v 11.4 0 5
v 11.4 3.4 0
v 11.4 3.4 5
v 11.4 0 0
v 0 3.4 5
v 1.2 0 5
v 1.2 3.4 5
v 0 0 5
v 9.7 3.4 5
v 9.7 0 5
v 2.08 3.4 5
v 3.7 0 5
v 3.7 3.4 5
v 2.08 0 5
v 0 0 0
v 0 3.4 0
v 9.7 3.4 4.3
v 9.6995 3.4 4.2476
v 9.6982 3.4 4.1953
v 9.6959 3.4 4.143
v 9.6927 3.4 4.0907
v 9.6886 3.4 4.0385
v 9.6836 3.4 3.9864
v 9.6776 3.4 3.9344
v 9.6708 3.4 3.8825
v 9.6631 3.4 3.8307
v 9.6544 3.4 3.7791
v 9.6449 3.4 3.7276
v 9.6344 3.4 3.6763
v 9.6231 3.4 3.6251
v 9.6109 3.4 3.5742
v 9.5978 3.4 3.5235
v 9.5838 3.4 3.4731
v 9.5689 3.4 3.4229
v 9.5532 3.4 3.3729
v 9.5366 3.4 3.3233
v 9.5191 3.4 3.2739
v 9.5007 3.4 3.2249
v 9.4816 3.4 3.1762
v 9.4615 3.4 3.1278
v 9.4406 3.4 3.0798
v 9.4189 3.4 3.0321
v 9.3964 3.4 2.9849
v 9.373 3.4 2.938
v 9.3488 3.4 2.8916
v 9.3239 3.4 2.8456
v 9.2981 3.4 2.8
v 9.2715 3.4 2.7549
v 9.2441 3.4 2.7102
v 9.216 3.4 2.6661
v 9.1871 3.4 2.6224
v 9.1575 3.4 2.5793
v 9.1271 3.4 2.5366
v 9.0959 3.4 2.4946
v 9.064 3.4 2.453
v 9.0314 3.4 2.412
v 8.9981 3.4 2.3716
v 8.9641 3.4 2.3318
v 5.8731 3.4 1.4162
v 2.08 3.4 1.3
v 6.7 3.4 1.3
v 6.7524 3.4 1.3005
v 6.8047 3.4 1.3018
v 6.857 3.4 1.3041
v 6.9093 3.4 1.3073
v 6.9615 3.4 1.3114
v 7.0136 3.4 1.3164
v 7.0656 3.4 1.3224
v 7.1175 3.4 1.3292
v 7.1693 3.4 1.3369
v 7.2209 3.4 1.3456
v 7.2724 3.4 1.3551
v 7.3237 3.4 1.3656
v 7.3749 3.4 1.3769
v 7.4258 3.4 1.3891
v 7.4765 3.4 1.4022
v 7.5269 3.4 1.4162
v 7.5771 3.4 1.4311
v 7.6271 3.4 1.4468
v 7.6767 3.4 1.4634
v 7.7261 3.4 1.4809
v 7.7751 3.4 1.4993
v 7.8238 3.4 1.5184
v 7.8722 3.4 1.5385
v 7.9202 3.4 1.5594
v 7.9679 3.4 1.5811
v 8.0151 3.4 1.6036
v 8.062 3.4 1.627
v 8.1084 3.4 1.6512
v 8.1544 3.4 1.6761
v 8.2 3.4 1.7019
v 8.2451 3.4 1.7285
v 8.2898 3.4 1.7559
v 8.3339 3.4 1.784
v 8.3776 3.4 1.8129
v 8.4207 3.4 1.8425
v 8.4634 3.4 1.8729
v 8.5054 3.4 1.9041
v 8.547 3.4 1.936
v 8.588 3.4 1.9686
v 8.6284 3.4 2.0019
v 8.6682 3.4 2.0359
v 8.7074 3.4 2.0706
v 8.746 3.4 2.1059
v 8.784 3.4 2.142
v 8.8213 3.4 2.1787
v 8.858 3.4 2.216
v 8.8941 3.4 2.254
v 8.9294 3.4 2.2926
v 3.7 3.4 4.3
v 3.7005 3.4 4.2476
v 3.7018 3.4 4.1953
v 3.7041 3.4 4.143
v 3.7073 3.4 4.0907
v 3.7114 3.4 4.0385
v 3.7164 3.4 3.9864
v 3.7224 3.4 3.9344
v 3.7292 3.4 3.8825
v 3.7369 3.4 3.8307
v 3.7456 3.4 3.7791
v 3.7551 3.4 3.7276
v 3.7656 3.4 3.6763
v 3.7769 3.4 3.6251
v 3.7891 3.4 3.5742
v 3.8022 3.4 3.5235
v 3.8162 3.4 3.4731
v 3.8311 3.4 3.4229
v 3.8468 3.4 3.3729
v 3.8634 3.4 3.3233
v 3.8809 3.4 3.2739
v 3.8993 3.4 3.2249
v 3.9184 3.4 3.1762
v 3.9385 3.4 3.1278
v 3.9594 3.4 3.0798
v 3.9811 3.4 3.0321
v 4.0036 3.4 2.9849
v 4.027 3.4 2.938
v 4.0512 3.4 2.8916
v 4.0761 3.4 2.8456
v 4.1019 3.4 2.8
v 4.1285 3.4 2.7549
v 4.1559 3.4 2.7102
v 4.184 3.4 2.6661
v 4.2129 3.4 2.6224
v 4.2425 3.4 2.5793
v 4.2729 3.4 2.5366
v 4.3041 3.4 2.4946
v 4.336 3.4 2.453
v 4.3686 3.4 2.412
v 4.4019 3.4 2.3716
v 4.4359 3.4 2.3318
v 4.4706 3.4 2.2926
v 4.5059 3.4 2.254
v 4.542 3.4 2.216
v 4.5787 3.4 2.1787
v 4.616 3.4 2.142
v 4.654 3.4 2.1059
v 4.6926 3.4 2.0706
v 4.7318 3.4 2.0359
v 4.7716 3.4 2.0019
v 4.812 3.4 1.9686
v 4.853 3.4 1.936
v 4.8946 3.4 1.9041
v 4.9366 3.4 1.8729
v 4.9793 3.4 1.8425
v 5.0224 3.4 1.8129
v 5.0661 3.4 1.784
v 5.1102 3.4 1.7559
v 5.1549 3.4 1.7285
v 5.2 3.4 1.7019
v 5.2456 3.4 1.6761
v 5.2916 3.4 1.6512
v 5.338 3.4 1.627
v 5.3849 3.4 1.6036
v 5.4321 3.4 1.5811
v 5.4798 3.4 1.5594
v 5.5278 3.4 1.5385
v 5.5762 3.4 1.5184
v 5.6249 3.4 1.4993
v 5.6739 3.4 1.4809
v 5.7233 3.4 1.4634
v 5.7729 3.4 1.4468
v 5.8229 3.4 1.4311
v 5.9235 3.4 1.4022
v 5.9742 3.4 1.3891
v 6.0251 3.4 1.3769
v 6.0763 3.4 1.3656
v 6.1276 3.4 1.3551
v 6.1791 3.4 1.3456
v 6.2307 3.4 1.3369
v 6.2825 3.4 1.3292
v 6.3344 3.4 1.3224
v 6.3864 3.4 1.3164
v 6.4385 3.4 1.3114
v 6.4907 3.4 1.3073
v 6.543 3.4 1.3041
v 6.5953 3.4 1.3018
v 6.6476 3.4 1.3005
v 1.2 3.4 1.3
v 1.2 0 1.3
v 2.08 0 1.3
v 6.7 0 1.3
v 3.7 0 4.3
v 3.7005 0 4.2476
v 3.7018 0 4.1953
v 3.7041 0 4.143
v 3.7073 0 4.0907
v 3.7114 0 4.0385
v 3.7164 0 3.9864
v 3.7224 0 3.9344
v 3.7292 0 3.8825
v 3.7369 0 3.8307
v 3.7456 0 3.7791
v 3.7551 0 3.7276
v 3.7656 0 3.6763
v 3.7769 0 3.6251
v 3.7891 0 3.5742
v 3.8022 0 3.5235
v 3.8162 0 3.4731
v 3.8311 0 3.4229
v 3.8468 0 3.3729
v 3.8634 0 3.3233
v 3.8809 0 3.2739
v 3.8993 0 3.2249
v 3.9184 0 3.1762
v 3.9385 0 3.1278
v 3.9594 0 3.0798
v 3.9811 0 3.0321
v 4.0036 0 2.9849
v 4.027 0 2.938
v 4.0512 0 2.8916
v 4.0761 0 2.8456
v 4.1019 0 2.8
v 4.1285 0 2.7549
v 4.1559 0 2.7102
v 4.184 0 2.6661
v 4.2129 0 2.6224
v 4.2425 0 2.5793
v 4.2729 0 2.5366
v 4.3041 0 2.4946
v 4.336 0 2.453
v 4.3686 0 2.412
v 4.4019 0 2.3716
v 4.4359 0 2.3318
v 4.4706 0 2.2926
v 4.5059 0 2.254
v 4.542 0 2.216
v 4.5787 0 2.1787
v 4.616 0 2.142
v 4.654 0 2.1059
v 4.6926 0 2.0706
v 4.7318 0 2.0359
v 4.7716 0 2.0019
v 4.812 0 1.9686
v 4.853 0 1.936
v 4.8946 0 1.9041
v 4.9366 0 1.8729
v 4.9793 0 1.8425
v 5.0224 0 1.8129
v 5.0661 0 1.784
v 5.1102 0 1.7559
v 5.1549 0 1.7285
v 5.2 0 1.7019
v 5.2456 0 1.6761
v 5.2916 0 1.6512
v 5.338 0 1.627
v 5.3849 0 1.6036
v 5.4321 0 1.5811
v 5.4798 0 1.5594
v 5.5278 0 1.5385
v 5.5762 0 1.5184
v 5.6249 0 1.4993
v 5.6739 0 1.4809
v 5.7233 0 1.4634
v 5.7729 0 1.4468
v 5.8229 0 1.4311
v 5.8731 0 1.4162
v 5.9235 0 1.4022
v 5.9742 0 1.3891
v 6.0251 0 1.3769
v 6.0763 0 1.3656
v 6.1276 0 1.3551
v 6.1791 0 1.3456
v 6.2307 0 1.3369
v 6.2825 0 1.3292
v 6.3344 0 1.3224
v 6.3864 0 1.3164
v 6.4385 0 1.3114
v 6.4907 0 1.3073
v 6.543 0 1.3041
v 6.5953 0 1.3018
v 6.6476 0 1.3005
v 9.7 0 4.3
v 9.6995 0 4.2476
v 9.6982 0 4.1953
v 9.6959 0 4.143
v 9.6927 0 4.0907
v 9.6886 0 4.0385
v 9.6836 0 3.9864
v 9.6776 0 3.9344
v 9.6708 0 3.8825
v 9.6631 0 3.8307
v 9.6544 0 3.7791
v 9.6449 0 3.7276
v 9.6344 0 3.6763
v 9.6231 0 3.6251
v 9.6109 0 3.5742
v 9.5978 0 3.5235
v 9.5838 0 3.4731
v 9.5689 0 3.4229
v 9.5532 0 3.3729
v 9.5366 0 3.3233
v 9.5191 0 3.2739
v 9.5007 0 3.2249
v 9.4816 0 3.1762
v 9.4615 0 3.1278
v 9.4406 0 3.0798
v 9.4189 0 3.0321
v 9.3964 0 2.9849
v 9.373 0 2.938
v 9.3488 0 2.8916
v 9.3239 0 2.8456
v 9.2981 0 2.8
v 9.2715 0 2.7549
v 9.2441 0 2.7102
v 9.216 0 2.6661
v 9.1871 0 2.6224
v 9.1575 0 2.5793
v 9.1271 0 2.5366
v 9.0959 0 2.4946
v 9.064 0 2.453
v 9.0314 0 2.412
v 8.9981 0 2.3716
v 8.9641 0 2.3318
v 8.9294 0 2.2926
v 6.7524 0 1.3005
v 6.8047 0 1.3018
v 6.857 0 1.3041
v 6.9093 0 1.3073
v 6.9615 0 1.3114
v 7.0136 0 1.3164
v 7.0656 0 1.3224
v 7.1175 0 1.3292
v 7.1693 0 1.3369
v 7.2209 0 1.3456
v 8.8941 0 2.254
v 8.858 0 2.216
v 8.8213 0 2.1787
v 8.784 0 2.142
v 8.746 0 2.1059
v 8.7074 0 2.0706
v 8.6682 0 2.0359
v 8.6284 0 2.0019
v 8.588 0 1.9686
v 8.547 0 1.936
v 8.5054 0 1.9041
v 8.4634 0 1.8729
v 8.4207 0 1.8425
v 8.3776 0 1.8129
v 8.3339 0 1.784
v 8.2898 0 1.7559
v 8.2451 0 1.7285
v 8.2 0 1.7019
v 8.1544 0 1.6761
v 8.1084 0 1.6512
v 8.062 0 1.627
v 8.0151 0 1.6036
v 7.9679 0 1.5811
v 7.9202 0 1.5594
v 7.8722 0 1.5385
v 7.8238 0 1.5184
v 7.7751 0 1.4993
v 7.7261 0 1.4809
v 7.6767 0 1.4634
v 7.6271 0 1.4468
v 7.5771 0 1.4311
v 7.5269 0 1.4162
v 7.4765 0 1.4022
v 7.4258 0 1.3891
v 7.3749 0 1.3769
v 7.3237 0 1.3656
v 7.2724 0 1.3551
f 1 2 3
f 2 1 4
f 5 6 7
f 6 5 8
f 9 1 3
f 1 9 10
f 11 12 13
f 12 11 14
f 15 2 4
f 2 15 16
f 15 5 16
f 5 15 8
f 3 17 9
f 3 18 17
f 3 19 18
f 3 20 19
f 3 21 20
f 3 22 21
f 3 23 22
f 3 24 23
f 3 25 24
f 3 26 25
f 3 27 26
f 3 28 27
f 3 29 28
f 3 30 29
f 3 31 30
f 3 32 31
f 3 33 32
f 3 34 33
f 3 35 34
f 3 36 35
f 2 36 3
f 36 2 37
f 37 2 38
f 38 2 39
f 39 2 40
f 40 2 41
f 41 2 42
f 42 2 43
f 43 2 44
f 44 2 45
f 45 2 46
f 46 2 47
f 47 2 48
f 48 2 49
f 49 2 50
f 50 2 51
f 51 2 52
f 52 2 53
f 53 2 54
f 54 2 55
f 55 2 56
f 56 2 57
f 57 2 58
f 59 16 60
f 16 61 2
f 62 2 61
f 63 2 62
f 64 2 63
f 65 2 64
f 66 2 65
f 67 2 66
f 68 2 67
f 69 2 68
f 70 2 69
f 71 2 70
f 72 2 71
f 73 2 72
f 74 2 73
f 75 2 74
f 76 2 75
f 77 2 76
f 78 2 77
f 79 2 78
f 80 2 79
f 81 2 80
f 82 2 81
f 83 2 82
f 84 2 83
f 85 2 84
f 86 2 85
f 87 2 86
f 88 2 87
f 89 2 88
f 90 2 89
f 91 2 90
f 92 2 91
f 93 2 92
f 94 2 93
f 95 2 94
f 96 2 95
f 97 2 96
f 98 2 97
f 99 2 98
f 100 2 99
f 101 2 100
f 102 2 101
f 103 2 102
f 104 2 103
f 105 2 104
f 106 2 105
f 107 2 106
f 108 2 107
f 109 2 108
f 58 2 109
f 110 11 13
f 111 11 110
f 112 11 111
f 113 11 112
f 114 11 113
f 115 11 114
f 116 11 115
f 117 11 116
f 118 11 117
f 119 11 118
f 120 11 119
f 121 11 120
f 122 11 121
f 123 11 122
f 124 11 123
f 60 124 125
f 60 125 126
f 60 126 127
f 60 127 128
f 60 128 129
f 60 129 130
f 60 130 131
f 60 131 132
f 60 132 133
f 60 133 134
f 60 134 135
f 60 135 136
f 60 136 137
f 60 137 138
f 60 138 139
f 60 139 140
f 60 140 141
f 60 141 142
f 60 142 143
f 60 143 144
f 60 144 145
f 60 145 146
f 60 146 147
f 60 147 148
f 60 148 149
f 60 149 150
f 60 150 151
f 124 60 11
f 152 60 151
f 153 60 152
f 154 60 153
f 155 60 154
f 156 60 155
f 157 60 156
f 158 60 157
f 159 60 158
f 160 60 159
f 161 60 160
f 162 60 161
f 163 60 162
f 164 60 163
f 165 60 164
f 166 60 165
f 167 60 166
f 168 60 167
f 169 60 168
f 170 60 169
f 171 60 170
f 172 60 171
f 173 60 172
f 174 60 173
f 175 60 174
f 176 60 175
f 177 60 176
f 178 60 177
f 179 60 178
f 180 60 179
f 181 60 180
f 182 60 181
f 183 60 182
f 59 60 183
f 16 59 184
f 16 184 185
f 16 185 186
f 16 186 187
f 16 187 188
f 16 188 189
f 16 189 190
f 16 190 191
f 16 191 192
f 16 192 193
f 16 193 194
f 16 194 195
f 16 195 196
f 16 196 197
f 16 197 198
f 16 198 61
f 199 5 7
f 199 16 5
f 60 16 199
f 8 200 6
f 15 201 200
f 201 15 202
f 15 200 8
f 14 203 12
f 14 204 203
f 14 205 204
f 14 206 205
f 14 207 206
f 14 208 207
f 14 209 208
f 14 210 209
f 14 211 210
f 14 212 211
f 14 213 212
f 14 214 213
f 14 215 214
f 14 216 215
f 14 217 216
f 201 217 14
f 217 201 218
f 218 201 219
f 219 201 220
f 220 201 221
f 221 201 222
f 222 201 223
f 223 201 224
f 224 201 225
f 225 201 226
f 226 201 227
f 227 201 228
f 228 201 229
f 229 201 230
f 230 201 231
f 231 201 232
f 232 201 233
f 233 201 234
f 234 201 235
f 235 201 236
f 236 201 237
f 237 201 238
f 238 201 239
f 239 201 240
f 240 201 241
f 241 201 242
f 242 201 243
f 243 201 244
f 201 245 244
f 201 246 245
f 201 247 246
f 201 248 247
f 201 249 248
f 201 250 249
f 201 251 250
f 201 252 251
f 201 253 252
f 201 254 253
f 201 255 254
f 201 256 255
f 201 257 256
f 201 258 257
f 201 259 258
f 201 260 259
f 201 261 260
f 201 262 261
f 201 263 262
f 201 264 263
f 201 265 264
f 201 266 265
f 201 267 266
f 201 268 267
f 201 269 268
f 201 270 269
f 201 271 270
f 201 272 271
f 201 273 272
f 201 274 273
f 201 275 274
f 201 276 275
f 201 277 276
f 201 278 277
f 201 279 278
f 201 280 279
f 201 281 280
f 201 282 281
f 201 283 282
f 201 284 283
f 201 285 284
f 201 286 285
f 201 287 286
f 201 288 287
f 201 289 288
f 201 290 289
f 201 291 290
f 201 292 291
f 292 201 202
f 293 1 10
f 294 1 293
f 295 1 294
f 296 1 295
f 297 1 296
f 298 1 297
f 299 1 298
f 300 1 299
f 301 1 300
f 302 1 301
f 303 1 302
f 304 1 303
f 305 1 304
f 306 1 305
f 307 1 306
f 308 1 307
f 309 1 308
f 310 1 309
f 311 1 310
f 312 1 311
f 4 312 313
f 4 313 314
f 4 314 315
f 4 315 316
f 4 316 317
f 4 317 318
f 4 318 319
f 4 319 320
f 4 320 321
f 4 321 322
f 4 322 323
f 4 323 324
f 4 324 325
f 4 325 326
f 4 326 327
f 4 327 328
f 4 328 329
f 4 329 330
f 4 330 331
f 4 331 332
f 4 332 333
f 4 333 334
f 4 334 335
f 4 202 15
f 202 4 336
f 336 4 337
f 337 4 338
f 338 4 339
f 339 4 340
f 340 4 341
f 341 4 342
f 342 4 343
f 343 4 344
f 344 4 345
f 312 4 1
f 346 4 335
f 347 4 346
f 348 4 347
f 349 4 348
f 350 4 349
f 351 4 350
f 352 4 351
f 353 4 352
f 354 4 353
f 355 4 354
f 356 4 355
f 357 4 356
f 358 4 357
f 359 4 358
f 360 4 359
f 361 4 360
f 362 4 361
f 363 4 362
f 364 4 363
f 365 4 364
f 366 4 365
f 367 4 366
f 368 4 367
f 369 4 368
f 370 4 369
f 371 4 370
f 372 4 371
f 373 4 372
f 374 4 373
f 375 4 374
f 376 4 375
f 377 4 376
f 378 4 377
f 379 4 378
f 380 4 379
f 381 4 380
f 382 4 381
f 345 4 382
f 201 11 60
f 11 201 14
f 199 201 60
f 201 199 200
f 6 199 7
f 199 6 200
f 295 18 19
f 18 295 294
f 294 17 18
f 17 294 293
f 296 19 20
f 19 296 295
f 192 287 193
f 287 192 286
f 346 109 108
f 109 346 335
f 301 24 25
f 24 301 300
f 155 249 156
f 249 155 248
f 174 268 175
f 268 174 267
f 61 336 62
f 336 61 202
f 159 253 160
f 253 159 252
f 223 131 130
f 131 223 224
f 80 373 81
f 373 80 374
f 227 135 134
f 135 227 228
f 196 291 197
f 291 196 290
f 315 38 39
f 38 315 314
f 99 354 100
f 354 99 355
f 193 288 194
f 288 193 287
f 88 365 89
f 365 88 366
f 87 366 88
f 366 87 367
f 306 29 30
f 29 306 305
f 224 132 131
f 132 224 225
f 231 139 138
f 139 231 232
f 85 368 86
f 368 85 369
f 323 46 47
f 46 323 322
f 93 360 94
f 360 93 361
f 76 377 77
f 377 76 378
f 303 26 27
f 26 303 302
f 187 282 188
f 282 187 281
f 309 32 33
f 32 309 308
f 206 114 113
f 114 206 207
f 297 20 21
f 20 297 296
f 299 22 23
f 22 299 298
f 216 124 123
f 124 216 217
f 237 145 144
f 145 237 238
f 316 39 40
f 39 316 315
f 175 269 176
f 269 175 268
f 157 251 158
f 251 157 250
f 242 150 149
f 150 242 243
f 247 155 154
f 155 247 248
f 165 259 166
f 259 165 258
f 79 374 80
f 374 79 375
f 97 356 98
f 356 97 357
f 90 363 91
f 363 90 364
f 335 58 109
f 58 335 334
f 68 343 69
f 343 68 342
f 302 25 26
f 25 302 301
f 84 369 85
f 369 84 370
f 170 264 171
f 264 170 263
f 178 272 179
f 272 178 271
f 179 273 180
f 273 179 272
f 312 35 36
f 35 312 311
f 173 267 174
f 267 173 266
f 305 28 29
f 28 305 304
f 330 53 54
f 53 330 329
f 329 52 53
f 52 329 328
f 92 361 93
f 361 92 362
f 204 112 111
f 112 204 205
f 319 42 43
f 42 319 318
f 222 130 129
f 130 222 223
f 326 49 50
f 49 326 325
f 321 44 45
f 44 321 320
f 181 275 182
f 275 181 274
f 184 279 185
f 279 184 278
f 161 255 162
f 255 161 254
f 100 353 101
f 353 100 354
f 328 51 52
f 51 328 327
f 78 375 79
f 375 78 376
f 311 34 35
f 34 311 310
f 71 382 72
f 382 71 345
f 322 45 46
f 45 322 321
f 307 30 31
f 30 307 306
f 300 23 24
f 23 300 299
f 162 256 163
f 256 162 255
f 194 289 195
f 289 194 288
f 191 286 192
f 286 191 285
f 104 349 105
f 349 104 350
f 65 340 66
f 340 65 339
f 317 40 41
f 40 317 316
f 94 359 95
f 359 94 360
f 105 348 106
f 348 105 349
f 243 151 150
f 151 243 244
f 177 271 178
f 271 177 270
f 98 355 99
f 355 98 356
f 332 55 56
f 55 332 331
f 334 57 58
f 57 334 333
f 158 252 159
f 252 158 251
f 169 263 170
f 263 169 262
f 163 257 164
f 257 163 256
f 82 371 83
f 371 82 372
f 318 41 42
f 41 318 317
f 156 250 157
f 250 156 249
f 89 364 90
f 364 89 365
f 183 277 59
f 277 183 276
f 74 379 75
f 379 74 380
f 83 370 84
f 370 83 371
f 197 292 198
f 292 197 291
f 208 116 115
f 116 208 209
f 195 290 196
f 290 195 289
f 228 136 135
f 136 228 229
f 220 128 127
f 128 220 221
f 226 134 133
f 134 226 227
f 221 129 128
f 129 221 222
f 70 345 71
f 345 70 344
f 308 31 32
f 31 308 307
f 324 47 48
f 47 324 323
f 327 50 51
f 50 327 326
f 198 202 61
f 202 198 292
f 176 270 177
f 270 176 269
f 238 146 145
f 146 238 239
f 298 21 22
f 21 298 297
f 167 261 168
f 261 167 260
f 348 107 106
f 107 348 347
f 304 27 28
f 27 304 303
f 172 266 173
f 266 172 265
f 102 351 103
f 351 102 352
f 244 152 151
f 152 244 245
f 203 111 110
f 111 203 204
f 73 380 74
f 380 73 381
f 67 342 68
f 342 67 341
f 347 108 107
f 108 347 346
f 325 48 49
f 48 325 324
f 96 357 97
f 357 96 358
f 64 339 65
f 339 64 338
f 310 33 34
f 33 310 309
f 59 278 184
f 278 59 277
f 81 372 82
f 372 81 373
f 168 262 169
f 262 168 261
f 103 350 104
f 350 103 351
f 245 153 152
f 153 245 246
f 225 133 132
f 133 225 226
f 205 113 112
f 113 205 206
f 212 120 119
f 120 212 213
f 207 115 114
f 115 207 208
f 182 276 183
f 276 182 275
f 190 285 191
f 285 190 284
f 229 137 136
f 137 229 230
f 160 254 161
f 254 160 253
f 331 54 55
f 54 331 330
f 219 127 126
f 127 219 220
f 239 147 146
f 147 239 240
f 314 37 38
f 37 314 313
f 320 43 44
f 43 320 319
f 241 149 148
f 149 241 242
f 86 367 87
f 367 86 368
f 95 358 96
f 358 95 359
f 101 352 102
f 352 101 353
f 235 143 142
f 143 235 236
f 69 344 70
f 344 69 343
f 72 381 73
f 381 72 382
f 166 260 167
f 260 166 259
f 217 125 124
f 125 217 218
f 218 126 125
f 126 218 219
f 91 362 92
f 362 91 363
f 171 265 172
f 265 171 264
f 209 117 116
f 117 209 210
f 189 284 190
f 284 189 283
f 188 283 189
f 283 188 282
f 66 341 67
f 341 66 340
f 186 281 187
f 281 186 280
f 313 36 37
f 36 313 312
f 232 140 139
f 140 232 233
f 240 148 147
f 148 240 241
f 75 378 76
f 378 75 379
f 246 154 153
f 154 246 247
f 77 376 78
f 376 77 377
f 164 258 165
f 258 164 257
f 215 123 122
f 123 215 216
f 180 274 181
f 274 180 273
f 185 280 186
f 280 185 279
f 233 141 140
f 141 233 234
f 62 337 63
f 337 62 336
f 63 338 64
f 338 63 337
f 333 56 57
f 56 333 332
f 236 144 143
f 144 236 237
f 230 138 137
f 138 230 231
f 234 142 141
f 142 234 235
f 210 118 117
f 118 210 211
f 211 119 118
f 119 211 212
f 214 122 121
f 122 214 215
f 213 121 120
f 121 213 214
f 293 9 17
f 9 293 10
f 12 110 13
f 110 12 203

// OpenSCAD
$fn=360;
eps=0.01;
m2_thrd=1.98/2;
m2_hole=2.60/2;
m25_thrd=2.46/2;
m25_hole=3.06/2;

difference() {
    cube([11.4, 3.4, 5]);
    translate([1.2, -eps, 1.3]) cube([0.88, 99, 99]);
    translate([6.7, -eps, 4.3]) rotate([270, 0, 0]) cylinder(99, 3, 3);
    translate([3.7, -eps, 4.3]) cube([6, 99, 99]);
}
